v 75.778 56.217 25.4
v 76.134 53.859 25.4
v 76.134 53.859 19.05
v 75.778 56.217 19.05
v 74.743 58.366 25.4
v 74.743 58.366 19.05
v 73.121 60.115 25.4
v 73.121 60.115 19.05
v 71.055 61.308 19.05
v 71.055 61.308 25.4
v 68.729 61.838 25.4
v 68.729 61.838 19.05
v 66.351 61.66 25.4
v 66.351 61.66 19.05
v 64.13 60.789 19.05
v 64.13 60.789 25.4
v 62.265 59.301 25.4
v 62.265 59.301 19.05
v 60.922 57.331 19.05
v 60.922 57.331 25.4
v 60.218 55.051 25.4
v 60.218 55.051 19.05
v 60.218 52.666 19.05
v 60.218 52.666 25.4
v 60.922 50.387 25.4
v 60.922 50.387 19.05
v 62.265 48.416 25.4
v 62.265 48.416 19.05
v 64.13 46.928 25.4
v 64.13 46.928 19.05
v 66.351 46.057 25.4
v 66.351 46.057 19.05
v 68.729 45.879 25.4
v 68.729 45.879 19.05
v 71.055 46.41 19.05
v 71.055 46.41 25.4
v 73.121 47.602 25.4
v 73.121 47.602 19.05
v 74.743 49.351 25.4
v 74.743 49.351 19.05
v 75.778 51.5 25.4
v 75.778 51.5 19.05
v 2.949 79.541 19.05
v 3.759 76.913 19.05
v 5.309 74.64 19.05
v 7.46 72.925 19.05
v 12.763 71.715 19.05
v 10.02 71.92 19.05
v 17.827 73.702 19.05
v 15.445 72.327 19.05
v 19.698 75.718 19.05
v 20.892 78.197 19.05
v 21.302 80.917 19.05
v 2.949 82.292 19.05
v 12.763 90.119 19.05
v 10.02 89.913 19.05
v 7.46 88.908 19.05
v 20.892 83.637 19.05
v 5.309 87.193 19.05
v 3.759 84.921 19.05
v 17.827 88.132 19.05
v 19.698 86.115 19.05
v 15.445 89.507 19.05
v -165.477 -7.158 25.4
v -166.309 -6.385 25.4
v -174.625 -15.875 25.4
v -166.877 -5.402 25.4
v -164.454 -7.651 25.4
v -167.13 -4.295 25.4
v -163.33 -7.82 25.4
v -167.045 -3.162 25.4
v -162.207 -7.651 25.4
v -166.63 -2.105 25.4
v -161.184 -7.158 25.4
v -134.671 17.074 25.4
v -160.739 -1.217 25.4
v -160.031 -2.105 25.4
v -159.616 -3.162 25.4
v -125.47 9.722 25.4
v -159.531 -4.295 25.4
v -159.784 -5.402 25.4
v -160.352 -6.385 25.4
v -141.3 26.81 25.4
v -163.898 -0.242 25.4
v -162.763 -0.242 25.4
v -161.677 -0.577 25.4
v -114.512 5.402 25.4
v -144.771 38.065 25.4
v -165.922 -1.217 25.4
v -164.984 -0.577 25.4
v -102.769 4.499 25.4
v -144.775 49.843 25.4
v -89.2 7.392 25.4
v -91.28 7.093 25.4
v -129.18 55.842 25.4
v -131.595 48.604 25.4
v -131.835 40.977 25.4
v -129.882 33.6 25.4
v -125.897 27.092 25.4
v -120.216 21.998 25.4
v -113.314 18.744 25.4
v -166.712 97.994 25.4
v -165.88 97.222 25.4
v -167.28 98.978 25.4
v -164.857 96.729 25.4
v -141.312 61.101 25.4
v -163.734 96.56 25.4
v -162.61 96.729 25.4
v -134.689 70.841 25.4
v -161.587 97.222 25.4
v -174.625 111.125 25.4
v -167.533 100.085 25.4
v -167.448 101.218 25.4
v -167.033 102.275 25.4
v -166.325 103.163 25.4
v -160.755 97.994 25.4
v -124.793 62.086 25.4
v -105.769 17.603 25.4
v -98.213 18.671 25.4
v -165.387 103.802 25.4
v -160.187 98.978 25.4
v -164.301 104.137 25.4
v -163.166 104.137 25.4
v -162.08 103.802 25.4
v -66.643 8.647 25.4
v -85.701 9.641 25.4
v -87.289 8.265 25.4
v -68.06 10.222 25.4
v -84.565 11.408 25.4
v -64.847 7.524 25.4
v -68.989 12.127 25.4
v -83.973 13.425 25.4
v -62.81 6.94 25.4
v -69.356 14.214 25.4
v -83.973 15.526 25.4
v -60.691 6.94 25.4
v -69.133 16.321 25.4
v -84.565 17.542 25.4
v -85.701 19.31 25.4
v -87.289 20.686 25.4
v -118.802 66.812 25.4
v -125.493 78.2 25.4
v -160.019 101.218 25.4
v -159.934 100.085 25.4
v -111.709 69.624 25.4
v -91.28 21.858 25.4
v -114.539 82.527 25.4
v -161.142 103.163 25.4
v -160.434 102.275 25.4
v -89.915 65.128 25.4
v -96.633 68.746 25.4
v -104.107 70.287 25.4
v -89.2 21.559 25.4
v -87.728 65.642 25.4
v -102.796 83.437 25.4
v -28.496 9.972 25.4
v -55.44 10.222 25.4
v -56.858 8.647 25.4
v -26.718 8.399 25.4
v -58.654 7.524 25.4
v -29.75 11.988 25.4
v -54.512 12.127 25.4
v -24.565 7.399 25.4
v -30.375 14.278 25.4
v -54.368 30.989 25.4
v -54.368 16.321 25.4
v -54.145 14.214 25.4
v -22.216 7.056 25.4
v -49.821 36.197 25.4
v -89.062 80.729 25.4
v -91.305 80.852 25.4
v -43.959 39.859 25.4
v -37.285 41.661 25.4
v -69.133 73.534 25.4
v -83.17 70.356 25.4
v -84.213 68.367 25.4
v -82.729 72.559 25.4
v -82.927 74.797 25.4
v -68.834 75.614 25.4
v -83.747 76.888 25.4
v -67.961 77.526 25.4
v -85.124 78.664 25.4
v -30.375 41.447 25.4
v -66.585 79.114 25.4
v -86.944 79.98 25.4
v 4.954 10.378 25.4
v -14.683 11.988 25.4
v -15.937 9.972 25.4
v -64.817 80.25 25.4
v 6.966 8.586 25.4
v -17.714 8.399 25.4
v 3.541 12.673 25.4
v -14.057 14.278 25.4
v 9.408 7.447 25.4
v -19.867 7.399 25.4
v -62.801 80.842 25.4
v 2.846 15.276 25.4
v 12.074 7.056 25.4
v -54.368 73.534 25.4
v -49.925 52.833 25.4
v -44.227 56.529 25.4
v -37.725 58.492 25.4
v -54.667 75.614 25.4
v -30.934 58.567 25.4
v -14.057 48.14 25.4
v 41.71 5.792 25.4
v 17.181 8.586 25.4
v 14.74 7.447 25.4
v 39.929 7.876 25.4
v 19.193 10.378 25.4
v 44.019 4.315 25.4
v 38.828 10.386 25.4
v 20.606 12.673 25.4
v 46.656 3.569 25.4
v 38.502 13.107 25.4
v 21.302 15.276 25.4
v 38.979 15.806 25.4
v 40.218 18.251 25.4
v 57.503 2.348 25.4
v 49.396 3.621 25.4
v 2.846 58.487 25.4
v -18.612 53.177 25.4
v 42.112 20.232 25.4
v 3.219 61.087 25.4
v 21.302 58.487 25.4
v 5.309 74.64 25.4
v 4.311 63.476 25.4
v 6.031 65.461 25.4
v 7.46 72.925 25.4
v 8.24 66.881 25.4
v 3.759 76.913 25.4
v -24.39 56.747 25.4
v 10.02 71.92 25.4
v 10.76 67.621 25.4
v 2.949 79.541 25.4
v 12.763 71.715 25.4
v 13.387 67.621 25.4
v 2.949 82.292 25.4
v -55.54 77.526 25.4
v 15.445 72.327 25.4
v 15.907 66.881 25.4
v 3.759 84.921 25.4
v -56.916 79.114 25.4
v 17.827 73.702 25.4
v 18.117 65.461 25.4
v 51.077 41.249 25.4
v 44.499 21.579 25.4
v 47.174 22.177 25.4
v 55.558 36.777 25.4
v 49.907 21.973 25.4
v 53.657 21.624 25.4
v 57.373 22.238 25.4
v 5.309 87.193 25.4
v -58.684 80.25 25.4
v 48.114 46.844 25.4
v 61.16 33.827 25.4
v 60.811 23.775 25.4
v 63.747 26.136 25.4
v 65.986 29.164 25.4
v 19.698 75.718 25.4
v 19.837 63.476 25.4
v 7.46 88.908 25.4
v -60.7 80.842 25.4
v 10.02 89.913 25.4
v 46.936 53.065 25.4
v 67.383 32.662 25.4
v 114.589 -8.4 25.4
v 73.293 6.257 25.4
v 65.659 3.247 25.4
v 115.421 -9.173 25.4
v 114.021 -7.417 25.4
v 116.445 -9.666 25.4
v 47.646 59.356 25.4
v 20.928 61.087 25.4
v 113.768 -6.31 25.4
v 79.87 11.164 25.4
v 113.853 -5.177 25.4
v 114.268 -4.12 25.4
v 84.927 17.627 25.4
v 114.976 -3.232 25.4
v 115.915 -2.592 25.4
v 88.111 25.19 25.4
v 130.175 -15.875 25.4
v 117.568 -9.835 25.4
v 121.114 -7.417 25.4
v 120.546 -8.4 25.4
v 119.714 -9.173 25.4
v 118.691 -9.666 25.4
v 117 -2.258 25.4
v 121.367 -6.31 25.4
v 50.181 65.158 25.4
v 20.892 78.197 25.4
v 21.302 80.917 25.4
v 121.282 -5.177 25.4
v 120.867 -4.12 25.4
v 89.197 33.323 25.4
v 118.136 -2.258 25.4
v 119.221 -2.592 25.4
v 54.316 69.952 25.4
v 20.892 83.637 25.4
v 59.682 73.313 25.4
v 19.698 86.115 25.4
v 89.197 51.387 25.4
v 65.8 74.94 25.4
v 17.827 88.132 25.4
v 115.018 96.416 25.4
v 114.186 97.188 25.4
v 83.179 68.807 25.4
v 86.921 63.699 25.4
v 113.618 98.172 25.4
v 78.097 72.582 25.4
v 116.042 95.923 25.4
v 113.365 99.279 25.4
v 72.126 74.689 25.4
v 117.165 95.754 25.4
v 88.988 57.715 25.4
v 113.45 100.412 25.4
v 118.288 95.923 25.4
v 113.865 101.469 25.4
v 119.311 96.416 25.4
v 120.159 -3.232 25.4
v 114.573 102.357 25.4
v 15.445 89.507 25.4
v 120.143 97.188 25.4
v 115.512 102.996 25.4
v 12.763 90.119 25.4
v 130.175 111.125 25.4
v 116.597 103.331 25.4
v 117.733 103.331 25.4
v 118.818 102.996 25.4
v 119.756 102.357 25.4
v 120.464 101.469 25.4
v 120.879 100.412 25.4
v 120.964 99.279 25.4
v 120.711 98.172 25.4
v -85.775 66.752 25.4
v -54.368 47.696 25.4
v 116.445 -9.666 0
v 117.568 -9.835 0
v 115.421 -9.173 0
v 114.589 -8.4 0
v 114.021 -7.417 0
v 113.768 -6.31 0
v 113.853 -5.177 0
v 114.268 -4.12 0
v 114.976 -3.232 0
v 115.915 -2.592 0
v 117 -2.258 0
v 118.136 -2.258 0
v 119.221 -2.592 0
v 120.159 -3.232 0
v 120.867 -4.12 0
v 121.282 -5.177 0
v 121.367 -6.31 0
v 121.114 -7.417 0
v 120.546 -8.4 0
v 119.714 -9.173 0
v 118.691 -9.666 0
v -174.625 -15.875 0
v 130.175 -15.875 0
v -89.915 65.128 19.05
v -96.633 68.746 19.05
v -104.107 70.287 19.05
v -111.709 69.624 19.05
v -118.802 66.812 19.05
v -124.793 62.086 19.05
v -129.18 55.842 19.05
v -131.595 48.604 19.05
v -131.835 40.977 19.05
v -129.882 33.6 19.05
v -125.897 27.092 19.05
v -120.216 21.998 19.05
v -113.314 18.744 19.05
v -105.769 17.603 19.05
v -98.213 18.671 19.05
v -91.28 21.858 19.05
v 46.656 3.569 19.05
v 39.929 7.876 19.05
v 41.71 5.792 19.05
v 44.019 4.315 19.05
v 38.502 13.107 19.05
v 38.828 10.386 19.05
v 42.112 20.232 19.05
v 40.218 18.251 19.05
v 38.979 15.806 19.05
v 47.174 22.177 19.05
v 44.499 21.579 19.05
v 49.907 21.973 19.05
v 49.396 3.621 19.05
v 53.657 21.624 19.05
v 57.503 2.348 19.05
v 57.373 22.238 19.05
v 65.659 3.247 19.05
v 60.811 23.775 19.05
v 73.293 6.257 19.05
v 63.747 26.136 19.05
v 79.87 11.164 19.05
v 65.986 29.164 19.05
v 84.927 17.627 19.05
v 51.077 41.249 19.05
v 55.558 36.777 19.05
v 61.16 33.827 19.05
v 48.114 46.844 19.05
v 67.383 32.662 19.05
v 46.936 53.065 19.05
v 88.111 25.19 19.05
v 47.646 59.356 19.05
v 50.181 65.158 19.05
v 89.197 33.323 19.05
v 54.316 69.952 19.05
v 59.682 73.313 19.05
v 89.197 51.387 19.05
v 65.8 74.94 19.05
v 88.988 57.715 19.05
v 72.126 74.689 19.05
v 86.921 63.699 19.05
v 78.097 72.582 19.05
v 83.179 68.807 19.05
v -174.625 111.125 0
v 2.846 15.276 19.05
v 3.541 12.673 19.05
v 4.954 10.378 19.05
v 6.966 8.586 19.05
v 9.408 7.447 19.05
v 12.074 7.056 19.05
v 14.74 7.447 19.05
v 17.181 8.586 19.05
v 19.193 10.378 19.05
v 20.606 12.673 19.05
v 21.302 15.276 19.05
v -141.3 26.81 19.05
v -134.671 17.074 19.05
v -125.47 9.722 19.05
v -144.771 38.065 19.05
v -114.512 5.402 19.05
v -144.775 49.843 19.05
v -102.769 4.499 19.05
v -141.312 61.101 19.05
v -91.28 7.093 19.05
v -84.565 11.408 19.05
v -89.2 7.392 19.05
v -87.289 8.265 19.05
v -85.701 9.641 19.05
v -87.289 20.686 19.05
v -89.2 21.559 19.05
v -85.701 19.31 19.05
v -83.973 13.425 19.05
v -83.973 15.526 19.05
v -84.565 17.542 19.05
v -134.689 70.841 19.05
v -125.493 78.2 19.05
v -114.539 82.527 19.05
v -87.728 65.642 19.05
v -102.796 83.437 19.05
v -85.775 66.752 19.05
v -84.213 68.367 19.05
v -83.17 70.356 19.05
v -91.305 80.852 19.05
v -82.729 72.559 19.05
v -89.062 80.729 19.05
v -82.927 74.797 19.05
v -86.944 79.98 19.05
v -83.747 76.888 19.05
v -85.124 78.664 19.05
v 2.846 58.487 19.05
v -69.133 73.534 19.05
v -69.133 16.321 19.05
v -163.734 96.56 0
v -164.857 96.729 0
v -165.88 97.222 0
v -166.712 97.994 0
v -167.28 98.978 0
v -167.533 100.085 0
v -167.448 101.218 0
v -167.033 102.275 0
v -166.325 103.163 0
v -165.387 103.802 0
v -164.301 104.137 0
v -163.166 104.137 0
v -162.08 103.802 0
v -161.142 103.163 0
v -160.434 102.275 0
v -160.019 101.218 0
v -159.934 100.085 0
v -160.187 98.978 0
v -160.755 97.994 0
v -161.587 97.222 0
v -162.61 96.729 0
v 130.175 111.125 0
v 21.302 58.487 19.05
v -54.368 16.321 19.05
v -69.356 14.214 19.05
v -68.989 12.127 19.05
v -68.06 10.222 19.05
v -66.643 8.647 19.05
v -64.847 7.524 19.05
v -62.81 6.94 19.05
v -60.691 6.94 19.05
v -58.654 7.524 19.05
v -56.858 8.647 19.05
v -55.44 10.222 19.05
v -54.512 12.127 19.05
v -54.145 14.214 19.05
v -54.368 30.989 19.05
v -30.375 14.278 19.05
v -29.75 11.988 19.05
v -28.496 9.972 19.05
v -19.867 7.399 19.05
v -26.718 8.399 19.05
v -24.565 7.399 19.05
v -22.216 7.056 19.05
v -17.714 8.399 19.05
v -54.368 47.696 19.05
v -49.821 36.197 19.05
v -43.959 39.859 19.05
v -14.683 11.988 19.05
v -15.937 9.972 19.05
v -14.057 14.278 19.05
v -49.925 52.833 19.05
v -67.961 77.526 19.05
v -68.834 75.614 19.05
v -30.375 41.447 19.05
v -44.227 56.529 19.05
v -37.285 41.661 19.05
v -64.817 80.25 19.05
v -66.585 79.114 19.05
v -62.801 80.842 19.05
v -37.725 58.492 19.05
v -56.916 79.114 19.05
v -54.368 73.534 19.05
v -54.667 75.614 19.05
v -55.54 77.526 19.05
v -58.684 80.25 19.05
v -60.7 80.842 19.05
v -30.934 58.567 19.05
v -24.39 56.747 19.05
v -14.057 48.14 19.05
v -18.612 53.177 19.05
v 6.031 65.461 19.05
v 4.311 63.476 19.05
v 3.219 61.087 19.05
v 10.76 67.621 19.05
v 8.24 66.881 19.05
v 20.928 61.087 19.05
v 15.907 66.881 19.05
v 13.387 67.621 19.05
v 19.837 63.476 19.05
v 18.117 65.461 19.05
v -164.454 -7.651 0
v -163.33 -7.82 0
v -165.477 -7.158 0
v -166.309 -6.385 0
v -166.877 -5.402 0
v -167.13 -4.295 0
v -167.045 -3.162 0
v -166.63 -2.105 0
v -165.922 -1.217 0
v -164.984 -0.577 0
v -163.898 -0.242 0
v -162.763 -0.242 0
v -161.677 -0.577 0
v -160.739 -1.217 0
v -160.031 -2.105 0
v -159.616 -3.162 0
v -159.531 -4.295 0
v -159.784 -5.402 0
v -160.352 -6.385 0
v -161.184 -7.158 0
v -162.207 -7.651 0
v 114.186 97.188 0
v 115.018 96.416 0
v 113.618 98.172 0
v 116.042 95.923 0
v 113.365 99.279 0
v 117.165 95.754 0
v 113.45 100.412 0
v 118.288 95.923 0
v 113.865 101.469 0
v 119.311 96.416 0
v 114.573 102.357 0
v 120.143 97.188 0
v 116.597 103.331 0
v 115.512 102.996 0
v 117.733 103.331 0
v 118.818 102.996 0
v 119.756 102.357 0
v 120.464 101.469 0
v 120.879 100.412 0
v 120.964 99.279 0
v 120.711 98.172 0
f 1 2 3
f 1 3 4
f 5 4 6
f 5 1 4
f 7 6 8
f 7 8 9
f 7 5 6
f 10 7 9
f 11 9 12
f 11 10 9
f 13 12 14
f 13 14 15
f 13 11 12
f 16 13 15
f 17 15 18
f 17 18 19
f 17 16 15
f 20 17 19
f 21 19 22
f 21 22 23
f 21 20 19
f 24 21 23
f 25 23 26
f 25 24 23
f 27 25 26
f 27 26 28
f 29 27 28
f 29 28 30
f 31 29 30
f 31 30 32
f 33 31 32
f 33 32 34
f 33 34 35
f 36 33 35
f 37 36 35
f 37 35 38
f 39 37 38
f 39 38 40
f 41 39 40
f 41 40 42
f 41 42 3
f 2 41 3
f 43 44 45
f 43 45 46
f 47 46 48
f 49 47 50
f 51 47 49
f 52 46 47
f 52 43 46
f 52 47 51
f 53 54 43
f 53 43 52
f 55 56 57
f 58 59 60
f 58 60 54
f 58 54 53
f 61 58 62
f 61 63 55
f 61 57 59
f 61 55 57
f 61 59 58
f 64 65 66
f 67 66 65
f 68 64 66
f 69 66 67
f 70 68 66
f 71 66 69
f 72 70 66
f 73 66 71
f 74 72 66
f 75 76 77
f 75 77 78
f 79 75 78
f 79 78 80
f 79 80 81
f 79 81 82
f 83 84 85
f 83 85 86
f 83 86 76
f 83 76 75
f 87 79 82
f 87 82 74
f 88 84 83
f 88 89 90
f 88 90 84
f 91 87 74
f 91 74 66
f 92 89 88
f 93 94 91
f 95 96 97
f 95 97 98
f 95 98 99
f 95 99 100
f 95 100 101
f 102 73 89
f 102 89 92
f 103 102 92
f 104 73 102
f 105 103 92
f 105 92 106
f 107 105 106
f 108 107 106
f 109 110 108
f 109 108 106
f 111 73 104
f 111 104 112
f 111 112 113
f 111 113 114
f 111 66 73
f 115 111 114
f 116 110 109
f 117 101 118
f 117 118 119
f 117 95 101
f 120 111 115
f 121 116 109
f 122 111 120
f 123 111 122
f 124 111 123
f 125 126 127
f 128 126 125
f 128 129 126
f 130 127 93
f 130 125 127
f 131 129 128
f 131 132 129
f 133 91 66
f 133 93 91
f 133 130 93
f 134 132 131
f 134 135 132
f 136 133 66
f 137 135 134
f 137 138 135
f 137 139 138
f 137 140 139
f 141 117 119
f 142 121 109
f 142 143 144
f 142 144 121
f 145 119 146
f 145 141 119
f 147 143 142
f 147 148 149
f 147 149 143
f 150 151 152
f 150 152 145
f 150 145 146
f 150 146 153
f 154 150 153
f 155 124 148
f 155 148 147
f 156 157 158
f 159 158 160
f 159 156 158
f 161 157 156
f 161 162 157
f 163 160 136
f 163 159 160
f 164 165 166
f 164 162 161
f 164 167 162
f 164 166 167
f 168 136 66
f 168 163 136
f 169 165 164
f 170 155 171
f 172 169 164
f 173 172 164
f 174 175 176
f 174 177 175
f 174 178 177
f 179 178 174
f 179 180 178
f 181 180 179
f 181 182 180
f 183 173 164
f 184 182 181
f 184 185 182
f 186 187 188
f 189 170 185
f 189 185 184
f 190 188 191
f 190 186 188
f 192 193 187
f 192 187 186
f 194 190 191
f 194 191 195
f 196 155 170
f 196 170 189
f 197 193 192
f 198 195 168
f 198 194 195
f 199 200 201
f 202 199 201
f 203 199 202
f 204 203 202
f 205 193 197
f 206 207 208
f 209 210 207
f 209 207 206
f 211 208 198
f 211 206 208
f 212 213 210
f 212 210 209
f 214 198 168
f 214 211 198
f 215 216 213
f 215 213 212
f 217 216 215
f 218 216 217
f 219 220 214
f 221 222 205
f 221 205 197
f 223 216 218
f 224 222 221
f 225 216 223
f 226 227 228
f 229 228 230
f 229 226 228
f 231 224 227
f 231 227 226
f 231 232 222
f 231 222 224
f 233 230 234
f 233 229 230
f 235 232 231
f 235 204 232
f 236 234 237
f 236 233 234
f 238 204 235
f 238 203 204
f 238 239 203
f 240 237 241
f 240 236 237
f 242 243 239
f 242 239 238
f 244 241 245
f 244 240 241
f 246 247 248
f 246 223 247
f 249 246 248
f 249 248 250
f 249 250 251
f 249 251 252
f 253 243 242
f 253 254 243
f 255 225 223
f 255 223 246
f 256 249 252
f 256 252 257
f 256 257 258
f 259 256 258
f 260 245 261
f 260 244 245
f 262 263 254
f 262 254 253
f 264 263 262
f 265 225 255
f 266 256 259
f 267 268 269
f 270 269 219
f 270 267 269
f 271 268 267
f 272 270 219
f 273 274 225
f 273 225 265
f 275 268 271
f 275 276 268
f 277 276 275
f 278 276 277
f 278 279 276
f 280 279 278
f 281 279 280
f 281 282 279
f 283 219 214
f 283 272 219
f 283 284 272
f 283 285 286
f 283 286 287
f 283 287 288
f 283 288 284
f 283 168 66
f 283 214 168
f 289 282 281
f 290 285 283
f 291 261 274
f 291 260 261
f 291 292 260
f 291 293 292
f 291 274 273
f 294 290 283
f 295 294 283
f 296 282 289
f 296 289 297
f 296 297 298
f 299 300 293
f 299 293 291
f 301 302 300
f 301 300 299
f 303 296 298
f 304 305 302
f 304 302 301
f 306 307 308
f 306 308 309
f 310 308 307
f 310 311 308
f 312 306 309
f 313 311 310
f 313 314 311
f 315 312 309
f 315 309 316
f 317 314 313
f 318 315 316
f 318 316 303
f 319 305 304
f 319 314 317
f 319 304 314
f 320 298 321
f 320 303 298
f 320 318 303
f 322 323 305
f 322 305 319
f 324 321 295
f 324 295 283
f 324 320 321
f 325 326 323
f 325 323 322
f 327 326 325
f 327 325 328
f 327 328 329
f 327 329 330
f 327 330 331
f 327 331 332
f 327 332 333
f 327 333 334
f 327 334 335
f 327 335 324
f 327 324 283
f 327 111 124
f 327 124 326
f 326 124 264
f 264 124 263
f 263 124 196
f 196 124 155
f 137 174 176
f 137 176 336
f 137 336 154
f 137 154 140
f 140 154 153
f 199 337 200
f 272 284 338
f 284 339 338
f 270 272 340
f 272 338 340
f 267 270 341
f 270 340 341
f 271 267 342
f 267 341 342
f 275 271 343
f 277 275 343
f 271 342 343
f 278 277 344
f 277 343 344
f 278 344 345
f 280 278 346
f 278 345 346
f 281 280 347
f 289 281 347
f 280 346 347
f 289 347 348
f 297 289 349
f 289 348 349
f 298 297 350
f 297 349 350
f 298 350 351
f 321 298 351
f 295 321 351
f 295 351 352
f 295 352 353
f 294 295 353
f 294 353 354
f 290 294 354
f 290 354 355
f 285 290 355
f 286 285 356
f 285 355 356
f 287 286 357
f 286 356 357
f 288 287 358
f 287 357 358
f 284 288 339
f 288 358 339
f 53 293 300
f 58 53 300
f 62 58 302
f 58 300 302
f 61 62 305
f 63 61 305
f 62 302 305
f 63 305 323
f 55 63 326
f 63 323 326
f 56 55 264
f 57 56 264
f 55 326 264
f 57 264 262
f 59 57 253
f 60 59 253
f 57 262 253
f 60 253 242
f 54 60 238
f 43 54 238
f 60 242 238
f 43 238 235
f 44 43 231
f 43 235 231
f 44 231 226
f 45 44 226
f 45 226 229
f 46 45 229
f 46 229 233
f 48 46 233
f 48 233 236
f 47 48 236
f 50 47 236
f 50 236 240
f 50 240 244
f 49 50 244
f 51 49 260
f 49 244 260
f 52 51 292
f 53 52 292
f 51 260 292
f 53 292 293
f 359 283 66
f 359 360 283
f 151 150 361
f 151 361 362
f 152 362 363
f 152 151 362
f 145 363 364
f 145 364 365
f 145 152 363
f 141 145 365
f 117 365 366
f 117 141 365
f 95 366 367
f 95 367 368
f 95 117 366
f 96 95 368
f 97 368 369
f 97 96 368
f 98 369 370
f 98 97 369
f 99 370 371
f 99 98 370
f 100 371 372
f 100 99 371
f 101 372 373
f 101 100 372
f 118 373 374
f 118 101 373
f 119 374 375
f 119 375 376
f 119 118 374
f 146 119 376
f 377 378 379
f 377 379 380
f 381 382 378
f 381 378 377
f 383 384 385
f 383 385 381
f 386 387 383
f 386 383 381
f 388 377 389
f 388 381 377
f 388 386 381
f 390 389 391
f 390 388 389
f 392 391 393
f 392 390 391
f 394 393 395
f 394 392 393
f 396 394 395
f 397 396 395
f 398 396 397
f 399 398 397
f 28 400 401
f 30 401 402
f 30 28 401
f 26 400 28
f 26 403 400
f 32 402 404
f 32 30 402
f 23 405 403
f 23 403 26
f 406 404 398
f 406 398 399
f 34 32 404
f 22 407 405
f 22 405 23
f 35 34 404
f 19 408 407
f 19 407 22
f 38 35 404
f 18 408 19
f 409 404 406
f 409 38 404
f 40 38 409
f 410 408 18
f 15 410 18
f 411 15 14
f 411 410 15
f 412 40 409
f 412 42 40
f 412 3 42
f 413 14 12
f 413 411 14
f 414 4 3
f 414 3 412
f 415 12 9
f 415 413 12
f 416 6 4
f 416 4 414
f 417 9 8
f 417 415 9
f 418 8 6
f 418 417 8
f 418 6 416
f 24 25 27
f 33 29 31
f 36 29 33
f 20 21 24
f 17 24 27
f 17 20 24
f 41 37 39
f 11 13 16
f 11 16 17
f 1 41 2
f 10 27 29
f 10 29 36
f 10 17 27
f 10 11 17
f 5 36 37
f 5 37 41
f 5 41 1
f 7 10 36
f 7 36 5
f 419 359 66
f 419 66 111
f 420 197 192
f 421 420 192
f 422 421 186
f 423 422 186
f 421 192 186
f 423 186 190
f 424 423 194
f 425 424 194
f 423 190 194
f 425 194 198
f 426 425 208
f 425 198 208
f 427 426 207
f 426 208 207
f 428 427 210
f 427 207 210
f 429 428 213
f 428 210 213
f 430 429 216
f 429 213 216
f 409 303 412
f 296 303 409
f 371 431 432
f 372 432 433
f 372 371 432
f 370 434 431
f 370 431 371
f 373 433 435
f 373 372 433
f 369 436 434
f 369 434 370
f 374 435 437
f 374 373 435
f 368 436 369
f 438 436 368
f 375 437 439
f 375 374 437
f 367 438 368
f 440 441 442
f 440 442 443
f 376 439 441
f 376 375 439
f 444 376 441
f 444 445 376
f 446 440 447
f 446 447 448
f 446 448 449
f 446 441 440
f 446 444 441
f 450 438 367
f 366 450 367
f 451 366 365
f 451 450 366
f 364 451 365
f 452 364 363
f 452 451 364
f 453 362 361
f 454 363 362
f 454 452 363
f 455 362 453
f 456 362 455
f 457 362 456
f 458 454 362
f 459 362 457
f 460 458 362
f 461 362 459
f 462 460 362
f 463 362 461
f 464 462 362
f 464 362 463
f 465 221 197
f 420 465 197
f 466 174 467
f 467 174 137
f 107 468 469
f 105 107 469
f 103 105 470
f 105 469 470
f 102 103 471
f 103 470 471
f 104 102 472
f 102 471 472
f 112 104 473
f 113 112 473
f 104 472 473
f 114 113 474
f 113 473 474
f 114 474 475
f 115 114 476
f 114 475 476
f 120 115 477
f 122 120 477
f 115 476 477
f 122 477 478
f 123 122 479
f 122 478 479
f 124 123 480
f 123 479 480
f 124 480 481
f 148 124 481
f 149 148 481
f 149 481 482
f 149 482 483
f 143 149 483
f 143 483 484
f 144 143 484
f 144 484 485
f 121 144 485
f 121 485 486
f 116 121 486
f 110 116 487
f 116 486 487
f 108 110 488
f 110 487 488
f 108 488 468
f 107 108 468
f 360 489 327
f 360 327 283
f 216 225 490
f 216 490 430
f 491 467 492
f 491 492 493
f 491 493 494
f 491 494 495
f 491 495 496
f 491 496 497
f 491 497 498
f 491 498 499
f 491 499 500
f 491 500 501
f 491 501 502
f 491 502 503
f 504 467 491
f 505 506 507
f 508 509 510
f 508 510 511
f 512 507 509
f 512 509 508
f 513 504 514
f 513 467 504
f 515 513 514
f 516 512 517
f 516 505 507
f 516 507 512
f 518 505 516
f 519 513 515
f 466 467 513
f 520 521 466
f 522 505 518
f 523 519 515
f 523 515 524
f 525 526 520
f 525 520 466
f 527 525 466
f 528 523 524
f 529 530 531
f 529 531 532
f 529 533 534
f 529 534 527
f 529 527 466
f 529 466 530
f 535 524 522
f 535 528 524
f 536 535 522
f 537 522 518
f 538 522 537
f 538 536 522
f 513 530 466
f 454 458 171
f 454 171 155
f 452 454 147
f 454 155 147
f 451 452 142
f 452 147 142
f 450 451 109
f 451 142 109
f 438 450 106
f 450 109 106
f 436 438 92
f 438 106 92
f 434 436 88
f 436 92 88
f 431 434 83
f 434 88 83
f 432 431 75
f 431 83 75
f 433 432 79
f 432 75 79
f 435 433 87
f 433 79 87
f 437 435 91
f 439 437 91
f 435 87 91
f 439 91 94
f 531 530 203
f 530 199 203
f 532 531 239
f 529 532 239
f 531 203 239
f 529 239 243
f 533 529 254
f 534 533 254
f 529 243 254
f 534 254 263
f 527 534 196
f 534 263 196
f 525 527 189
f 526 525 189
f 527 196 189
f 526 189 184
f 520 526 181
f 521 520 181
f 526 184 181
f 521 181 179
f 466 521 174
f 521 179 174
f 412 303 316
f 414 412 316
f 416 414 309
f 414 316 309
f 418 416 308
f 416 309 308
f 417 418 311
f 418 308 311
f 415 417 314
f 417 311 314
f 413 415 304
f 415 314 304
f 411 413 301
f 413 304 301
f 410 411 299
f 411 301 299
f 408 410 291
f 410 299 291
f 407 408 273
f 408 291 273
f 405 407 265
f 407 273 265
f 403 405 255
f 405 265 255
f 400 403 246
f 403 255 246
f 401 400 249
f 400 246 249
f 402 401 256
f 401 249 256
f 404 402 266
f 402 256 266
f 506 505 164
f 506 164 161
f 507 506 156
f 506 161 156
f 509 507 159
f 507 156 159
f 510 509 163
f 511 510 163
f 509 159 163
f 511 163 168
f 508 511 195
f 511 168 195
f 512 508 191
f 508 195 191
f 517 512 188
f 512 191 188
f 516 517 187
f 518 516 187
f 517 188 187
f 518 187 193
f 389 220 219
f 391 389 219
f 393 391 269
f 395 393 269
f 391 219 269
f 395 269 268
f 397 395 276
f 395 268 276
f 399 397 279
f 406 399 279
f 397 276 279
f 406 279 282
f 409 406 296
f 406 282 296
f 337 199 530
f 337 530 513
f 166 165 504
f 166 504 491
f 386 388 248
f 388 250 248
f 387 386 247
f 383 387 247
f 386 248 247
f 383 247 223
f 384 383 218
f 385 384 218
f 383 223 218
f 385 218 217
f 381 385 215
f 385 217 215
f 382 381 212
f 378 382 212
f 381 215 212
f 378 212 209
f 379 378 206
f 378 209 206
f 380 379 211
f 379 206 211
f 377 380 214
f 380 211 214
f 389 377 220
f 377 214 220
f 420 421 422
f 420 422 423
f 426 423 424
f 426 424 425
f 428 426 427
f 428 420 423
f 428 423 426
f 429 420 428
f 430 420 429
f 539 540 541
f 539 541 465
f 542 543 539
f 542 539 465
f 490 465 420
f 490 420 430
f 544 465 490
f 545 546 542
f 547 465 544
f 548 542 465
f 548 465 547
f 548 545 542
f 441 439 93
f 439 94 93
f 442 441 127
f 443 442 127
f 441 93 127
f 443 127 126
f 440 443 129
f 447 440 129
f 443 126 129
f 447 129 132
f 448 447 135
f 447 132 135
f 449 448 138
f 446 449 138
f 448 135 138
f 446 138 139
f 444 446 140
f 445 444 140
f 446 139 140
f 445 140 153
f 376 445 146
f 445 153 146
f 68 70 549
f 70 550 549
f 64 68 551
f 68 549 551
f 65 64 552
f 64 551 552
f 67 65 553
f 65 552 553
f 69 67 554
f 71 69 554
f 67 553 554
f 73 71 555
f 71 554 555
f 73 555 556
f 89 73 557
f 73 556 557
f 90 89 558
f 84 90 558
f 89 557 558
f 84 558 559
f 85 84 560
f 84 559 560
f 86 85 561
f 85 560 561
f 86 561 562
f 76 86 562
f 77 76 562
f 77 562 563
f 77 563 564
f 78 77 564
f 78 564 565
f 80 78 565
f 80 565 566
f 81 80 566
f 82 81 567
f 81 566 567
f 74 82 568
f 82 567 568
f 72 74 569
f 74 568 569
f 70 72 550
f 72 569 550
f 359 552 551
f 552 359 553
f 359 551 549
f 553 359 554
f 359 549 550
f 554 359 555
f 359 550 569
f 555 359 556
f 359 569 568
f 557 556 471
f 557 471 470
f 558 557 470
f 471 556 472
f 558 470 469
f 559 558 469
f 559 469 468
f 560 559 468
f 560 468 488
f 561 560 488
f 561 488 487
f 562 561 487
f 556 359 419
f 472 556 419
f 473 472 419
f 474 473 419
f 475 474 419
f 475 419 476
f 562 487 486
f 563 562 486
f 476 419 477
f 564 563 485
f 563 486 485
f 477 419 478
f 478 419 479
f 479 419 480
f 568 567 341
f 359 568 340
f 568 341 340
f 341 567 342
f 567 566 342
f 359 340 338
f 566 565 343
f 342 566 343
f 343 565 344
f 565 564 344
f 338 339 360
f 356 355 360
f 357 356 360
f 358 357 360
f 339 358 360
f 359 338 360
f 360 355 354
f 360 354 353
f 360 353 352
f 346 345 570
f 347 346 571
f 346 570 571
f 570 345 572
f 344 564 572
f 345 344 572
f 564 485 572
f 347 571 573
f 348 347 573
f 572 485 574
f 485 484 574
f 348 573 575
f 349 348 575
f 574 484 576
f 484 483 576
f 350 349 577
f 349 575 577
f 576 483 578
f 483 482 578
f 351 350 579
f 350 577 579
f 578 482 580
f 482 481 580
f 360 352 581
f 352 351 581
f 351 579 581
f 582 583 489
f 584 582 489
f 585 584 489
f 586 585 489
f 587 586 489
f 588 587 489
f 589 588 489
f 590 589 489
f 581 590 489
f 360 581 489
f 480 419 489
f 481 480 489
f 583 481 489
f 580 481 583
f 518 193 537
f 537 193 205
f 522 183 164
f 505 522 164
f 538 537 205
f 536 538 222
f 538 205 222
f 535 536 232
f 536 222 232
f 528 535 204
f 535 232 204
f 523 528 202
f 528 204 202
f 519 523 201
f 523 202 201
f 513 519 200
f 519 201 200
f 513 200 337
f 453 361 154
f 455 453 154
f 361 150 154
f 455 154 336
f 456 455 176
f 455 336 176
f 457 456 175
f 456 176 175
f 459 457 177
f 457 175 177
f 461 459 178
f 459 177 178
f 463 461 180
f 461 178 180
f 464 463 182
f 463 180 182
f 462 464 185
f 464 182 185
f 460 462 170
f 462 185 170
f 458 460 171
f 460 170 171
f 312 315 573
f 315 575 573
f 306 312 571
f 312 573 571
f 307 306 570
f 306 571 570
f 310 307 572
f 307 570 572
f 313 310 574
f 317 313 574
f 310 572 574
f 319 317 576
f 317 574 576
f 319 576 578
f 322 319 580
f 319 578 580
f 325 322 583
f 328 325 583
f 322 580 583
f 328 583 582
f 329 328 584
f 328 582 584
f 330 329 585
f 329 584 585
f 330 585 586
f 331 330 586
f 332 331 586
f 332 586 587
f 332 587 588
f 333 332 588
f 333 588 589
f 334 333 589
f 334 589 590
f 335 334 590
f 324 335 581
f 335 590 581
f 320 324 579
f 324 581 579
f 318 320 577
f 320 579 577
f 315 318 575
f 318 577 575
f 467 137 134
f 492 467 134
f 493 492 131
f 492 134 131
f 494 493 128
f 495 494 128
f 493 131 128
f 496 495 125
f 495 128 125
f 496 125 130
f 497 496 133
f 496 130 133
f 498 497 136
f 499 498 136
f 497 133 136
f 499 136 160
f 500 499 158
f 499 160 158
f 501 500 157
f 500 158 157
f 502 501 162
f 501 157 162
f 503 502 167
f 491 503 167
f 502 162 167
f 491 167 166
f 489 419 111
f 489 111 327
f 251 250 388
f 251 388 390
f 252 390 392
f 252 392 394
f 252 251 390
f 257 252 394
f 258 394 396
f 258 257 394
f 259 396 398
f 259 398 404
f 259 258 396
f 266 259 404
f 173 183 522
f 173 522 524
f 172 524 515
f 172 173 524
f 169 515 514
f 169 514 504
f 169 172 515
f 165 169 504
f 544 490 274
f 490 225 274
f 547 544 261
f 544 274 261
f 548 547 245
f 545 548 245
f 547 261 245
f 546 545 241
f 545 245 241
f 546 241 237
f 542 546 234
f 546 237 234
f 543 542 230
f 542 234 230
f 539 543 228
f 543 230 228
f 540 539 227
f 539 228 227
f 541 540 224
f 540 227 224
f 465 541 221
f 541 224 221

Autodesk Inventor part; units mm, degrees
ref_plane "YZ Plane" through (0, 0, 0) normal (1, 0, 0) x (0, 1, 0)
ref_plane "XZ Plane" through (0, 0, 0) normal (0, 1, 0) x (-1, 0, 0)
ref_plane "XY Plane" through (0, 0, 0) normal (0, 0, 1) x (1, 0, 0)
sketch "Sketch1" plane through (0, 0, 0) normal (0, 0, 1) x (1, 0, 0)
  line L0 (-174.625, 111.125) -> (130.175, 111.125)
  line L1 (130.175, 111.125) -> (130.175, -15.875)
  line L2 (130.175, -15.875) -> (-174.625, -15.875)
  line L3 (-174.625, -15.875) -> (-174.625, 111.125)
  point P0 (0, 0)
  dimension "d0" = 127
  dimension "d1" = 304.8
extrude "Extrusion1" add sketch "Sketch1" along normal blind 25.4
sketch "Sketch2" plane through (0, 0, 25.4) normal (0, 0, 1) x (1, 0, 0)
  arc A0 (-89.9147, 65.1281) -> (-91.28, 21.8576) centre (-105.641, 43.9675) ccw
  arc A1 (-91.3052, 80.8519) -> (-91.28, 7.0928) centre (-105.641, 43.9675) ccw
  arc A2 (-91.28, 7.0928) -> (-91.28, 21.8576) centre (-91.28, 14.4752) ccw
  arc A3 (-89.9147, 65.1281) -> (-91.3052, 80.8519) centre (-90.6099, 72.99) ccw
  line L0 (-69.1328, 16.3208) -> (-69.1328, 73.5344)
  line L1 (-54.368, 16.3208) -> (-54.368, 73.5344)
  arc A4 (-69.1328, 16.3208) -> (-54.368, 16.3208) centre (-61.7504, 14.4752) ccw
  arc A5 (-54.368, 73.5344) -> (-69.1328, 73.5344) centre (-61.7504, 73.5344) ccw
  arc A6 (-14.0573, 29.8688) -> (-54.368, 30.9892) centre (-34.5504, 18.2752) ccw
  arc A7 (-13.7648, 47.696) -> (-54.368, 47.696) centre (-34.0664, 34.6261) ccw
  line L2 (-14.0573, 29.8688) -> (-14.0573, 14.2776)
  line L3 (-14.0573, 48.1396) -> (-14.0573, 29.8688)
  line L4 (-30.3752, 14.2776) -> (-30.3752, 58.4872)
  arc A8 (-30.3752, 14.2776) -> (-14.0573, 14.2776) centre (-22.2162, 15.2758) ccw
  line L5 (2.8456, 15.2758) -> (2.8456, 58.4872)
  line L6 (21.3017, 15.2758) -> (21.3017, 58.4872)
  arc A9 (2.8456, 15.2758) -> (21.3017, 15.2758) centre (12.0736, 16.3458) ccw
  arc A10 (21.3017, 58.4872) -> (2.8456, 58.4872) centre (12.0736, 58.4872) ccw
  circle A11 centre (12.0736, 80.9168) radius 9.228
  circle A12 centre (68.1313, 53.8586) radius 21.2102
  circle A13 centre (68.1313, 53.8586) radius 8.0022
  arc A14 (49.3965, 3.6206) -> (89.1971, 33.323) centre (58.2137, 33.323) ccw
  line L7 (89.1971, 33.323) -> (89.1971, 51.3872)
  arc A15 (49.9069, 21.9732) -> (67.3833, 32.6616) centre (53.1362, 36.3249) ccw
  arc A16 (49.9069, 21.9732) -> (49.3965, 3.6206) centre (47.8533, 12.8469) ccw
  point P0 (0, 0)
  dimension "d42" = 13.208
  dimension "d43" = 13.208
emboss "Emboss1" sketch "Sketch2" operation cut depth 6.35 direction (0, 0, -1)
hole "Hole1" at (-163.3305, -4.0099, 25.4) direction (0, 0, -1) diameter 7.62 end through all
hole "Hole2" at (-163.7335, 100.3697, 25.4) direction (0, 0, -1) diameter 7.62 end through all
hole "Hole3" at (117.1647, 99.5637, 25.4) direction (0, 0, -1) diameter 7.62 end through all
hole "Hole4" at (117.5677, -6.025, 25.4) direction (0, 0, -1) diameter 7.62 end through all
properties part number "NewNameChirag"
